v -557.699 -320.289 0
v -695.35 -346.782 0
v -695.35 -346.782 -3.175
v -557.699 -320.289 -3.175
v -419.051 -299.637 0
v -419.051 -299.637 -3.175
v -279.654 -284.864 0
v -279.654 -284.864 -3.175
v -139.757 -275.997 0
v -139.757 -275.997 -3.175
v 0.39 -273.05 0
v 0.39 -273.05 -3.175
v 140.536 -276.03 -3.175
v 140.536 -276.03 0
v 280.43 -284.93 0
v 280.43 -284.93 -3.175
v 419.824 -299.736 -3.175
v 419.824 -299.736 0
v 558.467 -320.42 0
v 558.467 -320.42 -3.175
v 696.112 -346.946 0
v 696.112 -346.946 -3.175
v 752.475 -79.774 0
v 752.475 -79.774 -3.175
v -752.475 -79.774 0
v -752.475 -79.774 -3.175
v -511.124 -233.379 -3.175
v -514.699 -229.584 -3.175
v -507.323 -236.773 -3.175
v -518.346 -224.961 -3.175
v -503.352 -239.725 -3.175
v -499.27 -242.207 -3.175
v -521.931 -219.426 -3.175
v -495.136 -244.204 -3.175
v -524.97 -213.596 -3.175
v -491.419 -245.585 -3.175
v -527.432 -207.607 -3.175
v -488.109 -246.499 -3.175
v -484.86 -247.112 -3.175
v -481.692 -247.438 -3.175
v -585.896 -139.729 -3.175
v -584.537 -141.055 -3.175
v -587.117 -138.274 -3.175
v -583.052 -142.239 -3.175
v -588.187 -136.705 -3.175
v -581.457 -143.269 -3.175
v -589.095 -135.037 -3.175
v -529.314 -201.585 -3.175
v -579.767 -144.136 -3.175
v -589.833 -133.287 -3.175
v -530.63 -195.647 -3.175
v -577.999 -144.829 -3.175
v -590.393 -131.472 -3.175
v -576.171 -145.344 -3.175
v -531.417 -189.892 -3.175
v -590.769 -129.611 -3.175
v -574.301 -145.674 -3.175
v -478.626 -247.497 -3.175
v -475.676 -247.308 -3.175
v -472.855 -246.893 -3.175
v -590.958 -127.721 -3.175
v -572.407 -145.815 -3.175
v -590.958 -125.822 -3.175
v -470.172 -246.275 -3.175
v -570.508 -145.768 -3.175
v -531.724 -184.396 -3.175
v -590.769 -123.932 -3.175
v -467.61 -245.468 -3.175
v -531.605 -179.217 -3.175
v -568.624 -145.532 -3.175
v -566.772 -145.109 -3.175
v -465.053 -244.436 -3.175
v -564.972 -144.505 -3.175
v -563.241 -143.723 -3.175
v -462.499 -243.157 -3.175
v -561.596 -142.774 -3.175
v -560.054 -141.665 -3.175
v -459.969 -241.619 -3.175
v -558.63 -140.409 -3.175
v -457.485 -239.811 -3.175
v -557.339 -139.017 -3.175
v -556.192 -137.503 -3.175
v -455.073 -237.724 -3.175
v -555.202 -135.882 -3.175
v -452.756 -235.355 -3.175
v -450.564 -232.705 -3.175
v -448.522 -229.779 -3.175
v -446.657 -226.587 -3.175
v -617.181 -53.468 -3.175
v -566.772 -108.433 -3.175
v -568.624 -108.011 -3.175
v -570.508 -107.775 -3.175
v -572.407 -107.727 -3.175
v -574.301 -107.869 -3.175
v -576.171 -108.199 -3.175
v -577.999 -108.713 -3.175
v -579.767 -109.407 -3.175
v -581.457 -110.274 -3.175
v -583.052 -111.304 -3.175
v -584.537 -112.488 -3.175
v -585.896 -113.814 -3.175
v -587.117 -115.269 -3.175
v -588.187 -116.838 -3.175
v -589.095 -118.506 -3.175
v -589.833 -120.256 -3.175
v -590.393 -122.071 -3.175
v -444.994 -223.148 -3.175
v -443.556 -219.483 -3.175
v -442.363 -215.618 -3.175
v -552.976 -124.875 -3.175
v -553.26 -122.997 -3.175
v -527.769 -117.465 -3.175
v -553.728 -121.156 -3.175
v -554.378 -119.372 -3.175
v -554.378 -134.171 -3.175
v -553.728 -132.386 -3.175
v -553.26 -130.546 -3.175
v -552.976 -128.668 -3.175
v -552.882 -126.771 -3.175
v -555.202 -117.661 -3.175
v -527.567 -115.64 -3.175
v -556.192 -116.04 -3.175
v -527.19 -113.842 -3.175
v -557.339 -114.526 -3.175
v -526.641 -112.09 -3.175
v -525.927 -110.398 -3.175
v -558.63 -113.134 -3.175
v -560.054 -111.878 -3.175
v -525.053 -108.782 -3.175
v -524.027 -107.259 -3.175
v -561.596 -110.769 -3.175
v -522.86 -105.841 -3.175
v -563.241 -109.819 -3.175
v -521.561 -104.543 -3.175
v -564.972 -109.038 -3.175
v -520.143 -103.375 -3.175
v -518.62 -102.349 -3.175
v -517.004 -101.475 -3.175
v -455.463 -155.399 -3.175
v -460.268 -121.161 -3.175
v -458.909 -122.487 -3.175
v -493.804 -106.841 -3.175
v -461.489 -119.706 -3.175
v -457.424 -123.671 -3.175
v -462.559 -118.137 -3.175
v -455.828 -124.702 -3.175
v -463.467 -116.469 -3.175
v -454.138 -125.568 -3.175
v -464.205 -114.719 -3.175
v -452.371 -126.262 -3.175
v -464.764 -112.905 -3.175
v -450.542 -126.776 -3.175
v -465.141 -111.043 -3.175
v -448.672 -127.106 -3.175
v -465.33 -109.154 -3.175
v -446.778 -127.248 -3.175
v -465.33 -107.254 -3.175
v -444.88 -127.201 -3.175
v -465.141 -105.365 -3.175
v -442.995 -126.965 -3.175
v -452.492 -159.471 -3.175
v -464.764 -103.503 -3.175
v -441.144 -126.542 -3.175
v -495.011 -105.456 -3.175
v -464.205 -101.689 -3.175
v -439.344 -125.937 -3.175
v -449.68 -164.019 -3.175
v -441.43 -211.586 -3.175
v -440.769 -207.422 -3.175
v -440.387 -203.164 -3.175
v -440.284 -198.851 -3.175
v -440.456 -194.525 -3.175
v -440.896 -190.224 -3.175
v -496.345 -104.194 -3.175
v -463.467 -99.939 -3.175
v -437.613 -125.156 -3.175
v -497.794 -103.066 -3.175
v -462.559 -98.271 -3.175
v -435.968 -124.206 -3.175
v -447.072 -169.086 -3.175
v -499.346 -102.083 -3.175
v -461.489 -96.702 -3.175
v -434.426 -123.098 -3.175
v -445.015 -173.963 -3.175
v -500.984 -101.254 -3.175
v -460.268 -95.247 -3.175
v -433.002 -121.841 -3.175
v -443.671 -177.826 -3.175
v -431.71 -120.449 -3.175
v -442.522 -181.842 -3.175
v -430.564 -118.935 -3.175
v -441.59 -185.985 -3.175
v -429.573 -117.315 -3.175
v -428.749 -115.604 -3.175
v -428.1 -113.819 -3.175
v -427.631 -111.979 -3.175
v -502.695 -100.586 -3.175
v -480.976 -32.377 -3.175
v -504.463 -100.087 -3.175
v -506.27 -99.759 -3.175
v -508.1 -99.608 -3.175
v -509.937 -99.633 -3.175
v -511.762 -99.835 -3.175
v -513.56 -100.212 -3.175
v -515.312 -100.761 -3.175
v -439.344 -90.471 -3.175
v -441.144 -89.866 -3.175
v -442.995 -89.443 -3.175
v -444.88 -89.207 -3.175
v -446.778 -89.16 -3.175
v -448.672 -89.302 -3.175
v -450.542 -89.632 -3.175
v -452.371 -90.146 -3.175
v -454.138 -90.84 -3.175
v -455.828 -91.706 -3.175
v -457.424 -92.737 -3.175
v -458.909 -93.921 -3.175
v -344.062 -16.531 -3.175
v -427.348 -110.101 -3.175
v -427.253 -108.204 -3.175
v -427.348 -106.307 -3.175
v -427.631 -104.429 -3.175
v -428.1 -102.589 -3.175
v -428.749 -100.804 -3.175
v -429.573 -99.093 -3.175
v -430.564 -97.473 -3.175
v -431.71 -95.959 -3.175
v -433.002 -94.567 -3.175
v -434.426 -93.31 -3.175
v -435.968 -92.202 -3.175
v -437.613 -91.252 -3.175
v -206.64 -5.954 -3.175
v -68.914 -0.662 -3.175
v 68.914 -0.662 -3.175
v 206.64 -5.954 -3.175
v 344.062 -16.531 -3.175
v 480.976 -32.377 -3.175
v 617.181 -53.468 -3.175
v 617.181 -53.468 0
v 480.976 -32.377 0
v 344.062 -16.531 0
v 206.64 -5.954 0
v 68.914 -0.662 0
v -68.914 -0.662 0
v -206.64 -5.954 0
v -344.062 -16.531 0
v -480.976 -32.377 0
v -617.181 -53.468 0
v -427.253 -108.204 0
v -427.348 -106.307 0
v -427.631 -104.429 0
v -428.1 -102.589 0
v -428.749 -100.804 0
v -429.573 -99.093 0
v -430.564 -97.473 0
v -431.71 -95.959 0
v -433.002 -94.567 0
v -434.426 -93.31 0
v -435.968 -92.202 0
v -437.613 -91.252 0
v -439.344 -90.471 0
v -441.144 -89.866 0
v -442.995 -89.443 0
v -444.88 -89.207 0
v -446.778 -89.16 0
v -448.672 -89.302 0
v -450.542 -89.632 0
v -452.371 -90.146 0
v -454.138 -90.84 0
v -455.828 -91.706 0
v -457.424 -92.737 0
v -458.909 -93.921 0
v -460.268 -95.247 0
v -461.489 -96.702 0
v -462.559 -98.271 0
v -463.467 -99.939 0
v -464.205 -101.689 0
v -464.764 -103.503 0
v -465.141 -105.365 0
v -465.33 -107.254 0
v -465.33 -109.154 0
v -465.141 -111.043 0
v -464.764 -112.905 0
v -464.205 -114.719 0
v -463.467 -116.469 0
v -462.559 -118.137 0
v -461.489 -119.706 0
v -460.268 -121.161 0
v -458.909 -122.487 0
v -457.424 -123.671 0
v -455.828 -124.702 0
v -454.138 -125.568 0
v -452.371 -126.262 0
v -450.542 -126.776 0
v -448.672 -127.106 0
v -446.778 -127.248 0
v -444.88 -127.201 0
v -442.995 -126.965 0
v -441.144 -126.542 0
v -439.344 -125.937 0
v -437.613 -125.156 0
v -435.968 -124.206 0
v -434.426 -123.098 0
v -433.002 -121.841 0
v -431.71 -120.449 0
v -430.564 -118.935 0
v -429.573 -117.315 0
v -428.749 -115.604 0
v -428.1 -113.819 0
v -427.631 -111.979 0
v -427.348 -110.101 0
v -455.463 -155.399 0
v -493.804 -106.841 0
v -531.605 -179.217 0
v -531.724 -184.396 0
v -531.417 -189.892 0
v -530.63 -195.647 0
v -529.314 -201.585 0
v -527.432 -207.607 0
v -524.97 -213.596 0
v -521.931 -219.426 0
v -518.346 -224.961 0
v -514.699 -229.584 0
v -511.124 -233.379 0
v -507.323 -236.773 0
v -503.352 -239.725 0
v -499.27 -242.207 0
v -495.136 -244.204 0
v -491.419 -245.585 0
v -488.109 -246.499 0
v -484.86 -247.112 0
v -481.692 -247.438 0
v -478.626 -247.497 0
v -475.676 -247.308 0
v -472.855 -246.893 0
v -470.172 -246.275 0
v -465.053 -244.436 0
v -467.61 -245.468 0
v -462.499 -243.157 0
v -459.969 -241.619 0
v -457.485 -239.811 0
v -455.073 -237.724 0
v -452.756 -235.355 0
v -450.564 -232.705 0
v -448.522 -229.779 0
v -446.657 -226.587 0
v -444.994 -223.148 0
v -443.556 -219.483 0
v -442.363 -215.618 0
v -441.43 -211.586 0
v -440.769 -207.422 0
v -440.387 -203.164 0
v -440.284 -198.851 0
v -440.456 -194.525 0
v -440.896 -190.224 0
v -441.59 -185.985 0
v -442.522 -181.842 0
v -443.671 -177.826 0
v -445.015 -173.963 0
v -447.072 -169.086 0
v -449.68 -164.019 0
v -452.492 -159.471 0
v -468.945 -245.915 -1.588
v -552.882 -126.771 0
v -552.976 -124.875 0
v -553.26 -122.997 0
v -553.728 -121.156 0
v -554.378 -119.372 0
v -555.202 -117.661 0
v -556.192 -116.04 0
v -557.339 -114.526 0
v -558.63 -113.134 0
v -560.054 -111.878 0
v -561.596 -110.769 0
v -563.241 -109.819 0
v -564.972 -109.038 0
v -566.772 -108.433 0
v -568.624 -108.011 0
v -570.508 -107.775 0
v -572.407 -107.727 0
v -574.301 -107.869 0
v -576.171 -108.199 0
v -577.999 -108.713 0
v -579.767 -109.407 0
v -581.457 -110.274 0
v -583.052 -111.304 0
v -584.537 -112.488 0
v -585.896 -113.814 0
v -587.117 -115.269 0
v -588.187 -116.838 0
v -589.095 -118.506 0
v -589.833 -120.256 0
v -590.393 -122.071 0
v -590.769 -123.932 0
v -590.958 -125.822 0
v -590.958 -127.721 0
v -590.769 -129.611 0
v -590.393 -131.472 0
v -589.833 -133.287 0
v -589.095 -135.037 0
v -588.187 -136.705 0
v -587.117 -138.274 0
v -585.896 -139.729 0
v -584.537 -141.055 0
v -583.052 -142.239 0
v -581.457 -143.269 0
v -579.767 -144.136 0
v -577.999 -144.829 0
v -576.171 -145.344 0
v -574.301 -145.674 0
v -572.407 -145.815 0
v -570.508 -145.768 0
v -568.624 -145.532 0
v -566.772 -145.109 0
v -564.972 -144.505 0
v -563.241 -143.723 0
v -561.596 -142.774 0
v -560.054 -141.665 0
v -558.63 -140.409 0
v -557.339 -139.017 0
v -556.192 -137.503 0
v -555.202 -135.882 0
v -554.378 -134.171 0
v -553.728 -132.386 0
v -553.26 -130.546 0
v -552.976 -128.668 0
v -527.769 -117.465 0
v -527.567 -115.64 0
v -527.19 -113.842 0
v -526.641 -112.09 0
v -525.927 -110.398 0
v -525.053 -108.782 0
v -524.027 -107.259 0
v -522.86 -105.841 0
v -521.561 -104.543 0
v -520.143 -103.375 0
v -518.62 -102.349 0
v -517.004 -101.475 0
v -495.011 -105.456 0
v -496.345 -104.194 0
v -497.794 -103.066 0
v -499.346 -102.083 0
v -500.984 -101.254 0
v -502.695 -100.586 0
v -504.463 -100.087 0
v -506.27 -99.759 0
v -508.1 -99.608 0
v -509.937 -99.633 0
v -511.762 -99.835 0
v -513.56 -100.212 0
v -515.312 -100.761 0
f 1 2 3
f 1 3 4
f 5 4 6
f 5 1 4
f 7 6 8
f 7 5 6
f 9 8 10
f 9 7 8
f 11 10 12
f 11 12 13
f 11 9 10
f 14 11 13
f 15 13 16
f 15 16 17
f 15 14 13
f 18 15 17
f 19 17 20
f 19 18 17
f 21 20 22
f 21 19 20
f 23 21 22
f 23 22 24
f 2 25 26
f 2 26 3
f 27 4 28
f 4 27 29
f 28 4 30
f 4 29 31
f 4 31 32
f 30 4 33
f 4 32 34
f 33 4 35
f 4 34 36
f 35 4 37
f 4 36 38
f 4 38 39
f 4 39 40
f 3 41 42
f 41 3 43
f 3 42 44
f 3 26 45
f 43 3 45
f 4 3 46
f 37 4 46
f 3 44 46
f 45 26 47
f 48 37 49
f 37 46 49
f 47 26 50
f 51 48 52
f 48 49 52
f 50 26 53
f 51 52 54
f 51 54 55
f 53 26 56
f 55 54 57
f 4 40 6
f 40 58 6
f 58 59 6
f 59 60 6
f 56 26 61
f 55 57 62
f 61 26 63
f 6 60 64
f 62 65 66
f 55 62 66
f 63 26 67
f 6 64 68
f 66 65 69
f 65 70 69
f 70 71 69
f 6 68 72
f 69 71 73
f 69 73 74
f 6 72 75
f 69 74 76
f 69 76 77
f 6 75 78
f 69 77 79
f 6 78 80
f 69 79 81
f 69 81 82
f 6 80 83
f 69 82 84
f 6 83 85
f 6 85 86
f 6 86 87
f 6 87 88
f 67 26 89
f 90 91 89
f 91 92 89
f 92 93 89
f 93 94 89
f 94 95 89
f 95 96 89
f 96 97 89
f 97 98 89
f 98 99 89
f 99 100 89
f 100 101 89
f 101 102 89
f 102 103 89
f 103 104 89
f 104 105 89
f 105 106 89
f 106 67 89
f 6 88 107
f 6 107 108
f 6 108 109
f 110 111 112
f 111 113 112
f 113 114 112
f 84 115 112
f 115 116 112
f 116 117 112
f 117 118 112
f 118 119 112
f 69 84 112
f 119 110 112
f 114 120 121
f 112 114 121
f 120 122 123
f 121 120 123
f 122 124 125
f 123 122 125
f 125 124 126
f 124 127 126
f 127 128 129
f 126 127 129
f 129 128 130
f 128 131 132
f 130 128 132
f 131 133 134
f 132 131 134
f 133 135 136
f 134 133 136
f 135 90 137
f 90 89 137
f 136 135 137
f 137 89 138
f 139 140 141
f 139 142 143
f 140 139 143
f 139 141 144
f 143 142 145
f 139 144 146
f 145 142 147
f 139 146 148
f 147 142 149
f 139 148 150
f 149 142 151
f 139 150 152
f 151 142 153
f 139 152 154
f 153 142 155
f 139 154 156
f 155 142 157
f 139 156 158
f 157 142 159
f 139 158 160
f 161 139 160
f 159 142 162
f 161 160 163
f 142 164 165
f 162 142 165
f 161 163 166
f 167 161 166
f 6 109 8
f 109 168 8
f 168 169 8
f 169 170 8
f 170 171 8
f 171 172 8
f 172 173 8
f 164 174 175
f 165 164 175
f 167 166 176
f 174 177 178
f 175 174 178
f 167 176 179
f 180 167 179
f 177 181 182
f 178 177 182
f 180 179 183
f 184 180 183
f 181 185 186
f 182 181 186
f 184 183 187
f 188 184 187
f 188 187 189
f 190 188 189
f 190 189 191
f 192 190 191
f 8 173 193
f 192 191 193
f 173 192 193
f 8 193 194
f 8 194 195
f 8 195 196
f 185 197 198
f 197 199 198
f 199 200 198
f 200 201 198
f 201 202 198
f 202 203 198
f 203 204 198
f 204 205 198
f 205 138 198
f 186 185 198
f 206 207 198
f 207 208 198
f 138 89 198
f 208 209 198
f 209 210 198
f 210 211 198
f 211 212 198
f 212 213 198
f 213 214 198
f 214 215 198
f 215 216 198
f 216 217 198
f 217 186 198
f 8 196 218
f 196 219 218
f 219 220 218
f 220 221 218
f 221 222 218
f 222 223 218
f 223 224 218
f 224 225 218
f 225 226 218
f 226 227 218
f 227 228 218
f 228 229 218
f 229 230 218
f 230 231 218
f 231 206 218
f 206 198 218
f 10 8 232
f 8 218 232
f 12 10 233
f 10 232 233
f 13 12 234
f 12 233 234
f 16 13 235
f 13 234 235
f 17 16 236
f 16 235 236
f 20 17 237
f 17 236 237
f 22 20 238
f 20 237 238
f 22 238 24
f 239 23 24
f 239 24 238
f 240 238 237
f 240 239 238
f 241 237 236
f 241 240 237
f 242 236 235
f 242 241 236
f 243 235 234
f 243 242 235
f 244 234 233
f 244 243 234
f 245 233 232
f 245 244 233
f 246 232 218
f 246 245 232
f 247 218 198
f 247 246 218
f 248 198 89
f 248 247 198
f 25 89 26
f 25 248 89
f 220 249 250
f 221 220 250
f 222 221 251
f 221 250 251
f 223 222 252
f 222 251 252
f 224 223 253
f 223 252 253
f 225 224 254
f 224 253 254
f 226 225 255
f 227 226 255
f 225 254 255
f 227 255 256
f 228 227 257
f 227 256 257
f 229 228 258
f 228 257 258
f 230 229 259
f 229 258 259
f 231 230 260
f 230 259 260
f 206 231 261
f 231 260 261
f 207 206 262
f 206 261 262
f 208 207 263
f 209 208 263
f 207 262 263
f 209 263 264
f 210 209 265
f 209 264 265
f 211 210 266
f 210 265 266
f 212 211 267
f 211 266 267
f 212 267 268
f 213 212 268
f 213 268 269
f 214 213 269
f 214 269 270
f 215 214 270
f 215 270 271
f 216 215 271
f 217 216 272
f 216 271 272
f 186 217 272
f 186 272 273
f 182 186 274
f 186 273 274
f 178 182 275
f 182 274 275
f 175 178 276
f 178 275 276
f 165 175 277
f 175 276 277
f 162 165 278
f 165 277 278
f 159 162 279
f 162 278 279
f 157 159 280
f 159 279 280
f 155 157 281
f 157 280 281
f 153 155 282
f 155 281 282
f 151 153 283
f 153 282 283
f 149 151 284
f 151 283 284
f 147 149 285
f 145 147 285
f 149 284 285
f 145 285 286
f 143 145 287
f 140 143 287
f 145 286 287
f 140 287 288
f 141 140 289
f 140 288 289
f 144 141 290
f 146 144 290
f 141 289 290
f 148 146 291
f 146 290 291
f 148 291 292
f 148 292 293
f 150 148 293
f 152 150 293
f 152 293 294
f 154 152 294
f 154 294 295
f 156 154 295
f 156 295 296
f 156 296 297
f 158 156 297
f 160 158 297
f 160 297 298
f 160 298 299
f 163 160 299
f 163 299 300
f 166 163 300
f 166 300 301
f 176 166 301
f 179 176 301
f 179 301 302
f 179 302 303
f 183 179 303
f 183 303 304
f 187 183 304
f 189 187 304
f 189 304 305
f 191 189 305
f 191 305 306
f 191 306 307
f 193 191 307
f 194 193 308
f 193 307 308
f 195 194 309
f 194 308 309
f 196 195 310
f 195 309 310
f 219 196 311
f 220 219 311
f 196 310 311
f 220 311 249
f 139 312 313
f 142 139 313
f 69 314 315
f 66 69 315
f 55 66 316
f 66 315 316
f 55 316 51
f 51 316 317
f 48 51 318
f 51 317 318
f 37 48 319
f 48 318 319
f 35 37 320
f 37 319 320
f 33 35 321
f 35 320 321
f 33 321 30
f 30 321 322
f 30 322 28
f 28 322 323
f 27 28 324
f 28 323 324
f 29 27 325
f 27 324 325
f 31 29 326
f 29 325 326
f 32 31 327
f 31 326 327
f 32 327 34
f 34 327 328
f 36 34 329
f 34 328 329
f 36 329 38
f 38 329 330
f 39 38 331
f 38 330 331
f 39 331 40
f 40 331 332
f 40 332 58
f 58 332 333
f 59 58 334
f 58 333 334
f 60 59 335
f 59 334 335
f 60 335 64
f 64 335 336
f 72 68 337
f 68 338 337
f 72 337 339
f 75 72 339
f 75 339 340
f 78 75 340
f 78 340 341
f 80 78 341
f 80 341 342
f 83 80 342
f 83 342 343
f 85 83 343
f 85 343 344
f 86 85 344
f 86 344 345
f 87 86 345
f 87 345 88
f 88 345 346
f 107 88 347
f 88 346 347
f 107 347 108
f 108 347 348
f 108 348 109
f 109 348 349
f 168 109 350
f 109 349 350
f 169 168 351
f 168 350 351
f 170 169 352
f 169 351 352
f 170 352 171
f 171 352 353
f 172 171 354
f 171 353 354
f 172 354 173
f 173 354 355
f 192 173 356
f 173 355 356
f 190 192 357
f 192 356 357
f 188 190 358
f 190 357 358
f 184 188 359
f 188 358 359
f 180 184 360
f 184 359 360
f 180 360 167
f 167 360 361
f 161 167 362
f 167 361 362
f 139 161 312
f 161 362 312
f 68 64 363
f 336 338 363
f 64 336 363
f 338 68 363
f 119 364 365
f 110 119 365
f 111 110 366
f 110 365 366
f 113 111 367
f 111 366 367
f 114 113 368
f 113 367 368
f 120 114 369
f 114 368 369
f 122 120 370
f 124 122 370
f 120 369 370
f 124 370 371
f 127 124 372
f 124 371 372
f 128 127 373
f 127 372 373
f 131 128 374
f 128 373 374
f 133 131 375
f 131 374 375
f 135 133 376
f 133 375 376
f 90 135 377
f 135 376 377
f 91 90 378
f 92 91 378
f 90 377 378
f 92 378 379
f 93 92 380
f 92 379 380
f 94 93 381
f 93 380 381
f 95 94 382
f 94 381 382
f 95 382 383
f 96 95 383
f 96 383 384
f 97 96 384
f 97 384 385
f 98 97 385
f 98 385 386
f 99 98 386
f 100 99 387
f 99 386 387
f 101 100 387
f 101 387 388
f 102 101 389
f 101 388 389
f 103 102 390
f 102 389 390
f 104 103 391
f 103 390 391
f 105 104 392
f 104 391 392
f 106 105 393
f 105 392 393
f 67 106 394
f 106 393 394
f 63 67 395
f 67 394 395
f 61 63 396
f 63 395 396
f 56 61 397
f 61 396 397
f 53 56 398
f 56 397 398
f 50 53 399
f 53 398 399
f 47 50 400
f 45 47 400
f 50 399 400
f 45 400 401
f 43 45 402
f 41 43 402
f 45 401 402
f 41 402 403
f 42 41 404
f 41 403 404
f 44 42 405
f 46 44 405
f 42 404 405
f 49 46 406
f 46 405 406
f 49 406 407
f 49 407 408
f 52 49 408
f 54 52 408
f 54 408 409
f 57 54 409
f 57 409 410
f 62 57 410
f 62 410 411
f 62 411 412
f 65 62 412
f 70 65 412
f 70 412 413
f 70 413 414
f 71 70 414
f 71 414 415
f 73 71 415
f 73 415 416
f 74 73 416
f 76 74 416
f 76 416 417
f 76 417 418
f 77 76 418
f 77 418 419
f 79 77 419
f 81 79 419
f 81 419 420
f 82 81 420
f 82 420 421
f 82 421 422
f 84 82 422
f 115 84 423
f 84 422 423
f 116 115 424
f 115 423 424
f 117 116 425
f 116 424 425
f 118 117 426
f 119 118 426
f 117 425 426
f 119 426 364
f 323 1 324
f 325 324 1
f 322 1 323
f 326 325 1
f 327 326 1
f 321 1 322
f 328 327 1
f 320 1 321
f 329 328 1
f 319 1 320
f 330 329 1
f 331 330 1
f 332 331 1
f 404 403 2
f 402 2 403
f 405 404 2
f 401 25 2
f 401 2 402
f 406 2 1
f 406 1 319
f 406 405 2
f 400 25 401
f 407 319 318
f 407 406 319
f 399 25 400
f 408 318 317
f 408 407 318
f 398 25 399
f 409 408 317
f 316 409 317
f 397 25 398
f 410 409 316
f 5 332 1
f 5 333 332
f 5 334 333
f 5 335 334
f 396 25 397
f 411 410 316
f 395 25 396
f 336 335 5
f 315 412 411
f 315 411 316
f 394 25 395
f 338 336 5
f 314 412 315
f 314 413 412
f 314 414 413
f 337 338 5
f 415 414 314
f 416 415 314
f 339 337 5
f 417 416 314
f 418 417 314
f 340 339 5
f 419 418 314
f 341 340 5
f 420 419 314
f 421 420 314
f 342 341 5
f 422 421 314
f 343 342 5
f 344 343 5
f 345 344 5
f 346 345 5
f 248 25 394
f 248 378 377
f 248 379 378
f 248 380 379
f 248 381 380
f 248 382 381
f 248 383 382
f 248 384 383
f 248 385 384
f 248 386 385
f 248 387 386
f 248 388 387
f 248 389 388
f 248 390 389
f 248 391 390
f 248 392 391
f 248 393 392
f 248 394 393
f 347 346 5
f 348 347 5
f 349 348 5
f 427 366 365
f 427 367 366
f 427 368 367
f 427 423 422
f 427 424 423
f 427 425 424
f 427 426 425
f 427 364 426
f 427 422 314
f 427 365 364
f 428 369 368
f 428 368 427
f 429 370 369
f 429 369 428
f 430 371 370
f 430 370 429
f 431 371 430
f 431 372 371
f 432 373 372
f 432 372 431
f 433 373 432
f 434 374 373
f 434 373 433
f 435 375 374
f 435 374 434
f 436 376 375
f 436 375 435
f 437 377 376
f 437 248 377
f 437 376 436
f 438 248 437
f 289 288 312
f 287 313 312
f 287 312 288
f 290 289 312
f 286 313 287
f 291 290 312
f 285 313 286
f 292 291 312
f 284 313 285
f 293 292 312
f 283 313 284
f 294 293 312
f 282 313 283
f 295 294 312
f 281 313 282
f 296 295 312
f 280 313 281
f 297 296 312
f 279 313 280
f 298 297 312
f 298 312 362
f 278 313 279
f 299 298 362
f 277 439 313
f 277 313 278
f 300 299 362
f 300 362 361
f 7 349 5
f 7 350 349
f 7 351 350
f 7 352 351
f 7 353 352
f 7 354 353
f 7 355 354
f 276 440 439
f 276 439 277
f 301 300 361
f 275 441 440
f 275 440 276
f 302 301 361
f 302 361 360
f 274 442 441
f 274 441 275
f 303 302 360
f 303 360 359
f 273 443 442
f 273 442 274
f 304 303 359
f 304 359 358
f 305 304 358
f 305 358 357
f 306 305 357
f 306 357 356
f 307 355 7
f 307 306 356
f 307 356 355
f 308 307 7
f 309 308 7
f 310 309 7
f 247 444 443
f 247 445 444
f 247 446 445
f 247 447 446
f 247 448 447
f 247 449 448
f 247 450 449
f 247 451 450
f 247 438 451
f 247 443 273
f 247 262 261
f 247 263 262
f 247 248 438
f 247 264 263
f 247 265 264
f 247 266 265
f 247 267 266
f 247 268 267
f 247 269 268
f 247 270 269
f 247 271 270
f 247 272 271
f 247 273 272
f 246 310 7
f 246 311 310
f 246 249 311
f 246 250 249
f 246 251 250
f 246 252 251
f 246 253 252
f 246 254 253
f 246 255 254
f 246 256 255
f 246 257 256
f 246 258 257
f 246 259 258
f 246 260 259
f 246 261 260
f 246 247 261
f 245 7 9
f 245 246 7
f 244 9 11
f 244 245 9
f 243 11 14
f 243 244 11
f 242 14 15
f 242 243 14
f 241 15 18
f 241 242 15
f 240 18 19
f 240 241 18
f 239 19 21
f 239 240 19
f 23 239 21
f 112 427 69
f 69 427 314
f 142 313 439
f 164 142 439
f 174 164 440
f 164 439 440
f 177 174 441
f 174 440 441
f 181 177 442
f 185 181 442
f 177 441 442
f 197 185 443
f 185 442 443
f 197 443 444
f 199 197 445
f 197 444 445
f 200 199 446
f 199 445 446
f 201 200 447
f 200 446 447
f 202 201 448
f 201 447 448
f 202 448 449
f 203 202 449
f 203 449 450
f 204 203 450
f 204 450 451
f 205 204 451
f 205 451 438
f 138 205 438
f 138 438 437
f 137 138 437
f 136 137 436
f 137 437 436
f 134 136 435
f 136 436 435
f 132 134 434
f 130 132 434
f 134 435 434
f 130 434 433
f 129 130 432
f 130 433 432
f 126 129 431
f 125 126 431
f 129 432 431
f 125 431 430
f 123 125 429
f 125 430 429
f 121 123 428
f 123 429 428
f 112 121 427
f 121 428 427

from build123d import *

# Parameters (mm, degrees)
SKETCH1_R          = 19.05
BASE_EXTRUDE_DEPTH = 3.175


with BuildPart() as part:
    # Sketch1 → Base-Extrude (new body)
    with BuildSketch(Plane.XY):
        with BuildLine():
            Line((-752.475, -79.774296229), (-695.3504, -346.781975691))
            ThreePointArc((-695.3504, -346.781975691), (0.389674853, -273.050022898), (696.1124, -346.945505398))
            Line((696.1124, -346.945505398), (752.475, -79.774296229))
            ThreePointArc((752.475, -79.774296229), (0, 0), (-752.475, -79.774296229))
        make_face()
        with Locations((-446.3034, -108.204)):
            Circle(SKETCH1_R, mode=Mode.SUBTRACT)
        with Locations((-571.9318, -126.7714)):
            Circle(SKETCH1_R, mode=Mode.SUBTRACT)
        with BuildLine():
            Line((-527.768777415, -117.465403312), (-531.604993281, -179.217083351))
            add(Edge.make_bspline(
                [(-531.604993281, -179.217083351), (-537.072397888, -267.226056703), (-468.944973872, -245.915384382), (-400.817549855, -224.604712061), (-455.462578204, -155.39927311)],
                knots=[1.113887128, 1.113887128, 1.113887128, 3.141592654, 3.141592654, 5.169298179, 5.169298179, 5.169298179], degree=2, weights=[1, 0.52859414, 1, 0.52859414, 1]))
            Line((-455.462578204, -155.39927311), (-493.80437652, -106.841132272))
            ThreePointArc((-493.80437652, -106.841132272), (-514.442639374, -100.465315857), (-527.768777415, -117.465403312))
        make_face(mode=Mode.SUBTRACT)
    extrude(amount=-BASE_EXTRUDE_DEPTH)


solid = part.part
